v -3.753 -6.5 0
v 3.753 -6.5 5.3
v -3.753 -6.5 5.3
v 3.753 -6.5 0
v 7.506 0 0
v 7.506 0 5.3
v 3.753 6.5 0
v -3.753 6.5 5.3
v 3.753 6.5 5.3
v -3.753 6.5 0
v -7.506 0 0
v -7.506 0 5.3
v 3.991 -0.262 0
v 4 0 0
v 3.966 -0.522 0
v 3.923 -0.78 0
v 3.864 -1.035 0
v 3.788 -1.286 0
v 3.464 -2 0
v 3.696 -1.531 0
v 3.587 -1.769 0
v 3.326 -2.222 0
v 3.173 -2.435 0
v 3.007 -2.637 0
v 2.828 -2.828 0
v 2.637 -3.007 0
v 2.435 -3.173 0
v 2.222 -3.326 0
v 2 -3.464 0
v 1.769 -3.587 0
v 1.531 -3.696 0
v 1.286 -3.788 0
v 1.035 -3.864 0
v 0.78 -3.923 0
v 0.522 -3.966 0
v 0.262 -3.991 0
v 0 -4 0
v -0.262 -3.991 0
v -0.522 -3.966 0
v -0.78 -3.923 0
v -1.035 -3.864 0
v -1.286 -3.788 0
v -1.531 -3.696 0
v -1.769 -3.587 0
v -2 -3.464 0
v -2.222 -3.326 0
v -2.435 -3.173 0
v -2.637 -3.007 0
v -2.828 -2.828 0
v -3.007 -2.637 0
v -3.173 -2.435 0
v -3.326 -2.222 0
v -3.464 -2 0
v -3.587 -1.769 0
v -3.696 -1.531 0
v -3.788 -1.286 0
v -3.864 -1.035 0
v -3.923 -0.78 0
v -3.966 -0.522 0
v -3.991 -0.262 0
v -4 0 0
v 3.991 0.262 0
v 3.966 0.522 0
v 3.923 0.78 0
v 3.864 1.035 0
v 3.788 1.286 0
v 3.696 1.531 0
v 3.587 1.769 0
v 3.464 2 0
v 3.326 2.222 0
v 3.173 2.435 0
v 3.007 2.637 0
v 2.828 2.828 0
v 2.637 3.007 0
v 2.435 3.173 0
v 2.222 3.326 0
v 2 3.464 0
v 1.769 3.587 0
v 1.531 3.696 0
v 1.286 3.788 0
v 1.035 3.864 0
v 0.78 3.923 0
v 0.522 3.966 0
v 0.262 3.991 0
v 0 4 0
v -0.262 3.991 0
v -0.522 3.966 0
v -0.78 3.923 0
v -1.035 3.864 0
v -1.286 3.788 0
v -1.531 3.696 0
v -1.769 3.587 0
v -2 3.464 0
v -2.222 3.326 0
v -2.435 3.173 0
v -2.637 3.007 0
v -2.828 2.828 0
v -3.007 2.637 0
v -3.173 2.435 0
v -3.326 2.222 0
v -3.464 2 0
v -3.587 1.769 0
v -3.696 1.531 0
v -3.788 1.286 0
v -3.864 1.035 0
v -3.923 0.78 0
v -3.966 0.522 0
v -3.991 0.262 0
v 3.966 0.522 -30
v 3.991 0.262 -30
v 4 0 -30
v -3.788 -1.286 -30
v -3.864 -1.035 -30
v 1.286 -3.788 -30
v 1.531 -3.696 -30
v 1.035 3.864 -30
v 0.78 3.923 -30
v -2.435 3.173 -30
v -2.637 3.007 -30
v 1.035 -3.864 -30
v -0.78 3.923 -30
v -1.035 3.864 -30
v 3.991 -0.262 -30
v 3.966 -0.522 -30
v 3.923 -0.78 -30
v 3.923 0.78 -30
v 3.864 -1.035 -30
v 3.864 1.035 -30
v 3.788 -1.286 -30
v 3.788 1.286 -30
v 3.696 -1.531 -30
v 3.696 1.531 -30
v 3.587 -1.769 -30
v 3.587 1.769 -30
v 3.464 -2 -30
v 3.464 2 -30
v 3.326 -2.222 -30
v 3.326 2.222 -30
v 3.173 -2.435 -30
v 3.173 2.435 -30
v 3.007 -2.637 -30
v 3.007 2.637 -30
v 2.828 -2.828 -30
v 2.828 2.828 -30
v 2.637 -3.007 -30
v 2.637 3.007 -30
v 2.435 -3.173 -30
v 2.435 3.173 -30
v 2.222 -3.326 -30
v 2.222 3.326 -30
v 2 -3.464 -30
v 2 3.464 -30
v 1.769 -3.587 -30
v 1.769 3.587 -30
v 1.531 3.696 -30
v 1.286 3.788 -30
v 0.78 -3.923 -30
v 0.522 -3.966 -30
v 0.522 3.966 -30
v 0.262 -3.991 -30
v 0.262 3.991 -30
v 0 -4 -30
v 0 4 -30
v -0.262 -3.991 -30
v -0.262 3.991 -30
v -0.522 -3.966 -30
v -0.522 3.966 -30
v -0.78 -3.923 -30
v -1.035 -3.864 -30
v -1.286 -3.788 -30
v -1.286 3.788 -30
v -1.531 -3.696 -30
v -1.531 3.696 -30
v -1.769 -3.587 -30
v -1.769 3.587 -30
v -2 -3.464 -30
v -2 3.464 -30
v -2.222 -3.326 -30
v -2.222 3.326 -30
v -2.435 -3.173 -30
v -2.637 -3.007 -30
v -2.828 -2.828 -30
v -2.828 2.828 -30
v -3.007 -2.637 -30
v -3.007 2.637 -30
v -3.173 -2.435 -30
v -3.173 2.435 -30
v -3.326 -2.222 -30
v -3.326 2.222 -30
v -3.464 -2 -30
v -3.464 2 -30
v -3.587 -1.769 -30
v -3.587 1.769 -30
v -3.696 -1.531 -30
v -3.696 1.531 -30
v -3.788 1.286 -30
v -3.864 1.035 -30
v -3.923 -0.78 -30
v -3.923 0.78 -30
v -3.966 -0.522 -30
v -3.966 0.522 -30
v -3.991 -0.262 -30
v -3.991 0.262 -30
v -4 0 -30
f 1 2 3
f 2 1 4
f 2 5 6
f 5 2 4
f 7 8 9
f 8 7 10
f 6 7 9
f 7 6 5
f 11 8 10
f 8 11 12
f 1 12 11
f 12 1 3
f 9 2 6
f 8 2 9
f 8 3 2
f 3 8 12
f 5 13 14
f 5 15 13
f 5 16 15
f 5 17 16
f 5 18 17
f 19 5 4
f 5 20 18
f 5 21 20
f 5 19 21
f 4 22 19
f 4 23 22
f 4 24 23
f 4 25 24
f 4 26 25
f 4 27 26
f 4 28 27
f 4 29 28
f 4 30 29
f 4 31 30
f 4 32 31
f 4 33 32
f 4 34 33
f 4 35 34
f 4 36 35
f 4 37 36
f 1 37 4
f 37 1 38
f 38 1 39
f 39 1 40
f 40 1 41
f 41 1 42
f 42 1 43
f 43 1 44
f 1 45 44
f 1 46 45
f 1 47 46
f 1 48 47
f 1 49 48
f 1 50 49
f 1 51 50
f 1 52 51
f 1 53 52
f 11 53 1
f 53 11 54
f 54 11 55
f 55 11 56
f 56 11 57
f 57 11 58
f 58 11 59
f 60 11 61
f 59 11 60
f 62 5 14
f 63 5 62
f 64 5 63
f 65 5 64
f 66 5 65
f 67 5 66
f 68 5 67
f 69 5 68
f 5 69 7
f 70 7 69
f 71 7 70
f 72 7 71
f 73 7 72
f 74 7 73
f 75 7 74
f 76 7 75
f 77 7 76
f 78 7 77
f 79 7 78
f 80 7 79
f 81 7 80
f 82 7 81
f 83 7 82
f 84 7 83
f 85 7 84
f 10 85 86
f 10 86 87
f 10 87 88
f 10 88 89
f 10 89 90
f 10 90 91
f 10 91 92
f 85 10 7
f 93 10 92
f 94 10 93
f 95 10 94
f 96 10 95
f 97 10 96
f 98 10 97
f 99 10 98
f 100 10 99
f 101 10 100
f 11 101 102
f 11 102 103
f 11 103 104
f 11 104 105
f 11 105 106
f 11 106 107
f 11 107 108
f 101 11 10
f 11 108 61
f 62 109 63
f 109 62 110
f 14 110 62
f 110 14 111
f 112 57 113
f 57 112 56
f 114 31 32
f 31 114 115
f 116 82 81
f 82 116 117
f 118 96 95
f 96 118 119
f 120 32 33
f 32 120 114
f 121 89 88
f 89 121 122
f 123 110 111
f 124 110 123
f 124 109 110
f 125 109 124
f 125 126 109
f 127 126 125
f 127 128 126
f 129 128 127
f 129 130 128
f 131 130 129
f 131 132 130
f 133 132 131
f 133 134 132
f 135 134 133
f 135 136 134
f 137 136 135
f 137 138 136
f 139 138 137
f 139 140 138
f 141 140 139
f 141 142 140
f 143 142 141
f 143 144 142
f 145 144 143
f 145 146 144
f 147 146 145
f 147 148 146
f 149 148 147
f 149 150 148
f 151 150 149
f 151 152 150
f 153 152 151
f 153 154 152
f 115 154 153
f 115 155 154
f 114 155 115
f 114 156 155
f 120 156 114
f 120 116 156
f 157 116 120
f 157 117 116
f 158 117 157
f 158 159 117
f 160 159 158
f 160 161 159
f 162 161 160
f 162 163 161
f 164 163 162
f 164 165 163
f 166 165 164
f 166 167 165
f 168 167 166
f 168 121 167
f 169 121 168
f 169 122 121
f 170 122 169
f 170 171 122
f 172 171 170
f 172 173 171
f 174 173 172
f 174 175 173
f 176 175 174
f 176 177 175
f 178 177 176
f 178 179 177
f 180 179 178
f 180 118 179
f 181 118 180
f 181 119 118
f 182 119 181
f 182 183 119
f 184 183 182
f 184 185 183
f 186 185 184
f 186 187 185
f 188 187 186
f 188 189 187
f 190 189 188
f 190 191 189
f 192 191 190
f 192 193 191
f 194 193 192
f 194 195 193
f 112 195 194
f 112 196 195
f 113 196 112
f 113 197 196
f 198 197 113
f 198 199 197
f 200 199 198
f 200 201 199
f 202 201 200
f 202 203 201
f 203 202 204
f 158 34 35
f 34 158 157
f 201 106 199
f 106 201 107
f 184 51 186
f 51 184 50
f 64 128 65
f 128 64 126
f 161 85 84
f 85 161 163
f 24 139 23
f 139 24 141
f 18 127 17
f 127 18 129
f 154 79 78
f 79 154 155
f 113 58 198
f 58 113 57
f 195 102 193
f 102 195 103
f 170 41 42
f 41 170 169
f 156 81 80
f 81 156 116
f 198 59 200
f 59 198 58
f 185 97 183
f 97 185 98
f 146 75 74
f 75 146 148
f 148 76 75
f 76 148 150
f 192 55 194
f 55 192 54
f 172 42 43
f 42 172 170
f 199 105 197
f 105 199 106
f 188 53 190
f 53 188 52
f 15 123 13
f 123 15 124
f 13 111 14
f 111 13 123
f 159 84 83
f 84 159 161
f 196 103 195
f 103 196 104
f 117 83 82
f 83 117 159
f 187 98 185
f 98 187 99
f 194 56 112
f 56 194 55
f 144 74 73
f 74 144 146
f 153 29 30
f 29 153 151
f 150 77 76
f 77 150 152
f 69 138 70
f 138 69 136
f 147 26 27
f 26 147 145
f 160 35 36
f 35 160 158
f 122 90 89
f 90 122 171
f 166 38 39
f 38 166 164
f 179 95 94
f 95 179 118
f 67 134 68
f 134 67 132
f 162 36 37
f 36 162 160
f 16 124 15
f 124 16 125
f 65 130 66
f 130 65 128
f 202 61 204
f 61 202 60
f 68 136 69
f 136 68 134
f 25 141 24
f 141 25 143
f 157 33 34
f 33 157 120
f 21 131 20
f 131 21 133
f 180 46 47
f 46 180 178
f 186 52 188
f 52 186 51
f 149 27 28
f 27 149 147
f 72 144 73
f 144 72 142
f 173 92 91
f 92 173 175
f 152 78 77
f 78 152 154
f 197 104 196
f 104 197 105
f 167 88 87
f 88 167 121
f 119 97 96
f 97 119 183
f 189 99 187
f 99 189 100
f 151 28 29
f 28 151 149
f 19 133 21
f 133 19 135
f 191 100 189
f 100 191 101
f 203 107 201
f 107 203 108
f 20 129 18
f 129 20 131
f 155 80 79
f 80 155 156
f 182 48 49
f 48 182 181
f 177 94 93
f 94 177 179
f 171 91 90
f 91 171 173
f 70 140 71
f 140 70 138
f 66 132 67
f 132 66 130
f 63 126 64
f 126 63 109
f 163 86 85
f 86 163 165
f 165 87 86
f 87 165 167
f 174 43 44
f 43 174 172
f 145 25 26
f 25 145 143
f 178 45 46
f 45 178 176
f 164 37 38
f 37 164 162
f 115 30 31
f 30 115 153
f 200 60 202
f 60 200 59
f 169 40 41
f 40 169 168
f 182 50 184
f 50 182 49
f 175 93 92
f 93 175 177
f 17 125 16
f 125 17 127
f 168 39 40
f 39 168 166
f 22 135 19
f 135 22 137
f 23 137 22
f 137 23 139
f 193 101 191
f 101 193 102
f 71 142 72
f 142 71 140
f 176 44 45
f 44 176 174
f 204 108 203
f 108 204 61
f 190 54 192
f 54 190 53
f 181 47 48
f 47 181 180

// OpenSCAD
head_af = 13;
head_height = 5.3;
shank_diameter = 8;
shank_length = 30;

union() {
    cylinder(
        h = head_height,
        d = head_af / cos(30),
        center = false,
        $fn = 6
    );

    translate([0, 0, -shank_length])
        cylinder(
            h = shank_length,
            d = shank_diameter,
            center = false,
            $fn = 96
        );
}
